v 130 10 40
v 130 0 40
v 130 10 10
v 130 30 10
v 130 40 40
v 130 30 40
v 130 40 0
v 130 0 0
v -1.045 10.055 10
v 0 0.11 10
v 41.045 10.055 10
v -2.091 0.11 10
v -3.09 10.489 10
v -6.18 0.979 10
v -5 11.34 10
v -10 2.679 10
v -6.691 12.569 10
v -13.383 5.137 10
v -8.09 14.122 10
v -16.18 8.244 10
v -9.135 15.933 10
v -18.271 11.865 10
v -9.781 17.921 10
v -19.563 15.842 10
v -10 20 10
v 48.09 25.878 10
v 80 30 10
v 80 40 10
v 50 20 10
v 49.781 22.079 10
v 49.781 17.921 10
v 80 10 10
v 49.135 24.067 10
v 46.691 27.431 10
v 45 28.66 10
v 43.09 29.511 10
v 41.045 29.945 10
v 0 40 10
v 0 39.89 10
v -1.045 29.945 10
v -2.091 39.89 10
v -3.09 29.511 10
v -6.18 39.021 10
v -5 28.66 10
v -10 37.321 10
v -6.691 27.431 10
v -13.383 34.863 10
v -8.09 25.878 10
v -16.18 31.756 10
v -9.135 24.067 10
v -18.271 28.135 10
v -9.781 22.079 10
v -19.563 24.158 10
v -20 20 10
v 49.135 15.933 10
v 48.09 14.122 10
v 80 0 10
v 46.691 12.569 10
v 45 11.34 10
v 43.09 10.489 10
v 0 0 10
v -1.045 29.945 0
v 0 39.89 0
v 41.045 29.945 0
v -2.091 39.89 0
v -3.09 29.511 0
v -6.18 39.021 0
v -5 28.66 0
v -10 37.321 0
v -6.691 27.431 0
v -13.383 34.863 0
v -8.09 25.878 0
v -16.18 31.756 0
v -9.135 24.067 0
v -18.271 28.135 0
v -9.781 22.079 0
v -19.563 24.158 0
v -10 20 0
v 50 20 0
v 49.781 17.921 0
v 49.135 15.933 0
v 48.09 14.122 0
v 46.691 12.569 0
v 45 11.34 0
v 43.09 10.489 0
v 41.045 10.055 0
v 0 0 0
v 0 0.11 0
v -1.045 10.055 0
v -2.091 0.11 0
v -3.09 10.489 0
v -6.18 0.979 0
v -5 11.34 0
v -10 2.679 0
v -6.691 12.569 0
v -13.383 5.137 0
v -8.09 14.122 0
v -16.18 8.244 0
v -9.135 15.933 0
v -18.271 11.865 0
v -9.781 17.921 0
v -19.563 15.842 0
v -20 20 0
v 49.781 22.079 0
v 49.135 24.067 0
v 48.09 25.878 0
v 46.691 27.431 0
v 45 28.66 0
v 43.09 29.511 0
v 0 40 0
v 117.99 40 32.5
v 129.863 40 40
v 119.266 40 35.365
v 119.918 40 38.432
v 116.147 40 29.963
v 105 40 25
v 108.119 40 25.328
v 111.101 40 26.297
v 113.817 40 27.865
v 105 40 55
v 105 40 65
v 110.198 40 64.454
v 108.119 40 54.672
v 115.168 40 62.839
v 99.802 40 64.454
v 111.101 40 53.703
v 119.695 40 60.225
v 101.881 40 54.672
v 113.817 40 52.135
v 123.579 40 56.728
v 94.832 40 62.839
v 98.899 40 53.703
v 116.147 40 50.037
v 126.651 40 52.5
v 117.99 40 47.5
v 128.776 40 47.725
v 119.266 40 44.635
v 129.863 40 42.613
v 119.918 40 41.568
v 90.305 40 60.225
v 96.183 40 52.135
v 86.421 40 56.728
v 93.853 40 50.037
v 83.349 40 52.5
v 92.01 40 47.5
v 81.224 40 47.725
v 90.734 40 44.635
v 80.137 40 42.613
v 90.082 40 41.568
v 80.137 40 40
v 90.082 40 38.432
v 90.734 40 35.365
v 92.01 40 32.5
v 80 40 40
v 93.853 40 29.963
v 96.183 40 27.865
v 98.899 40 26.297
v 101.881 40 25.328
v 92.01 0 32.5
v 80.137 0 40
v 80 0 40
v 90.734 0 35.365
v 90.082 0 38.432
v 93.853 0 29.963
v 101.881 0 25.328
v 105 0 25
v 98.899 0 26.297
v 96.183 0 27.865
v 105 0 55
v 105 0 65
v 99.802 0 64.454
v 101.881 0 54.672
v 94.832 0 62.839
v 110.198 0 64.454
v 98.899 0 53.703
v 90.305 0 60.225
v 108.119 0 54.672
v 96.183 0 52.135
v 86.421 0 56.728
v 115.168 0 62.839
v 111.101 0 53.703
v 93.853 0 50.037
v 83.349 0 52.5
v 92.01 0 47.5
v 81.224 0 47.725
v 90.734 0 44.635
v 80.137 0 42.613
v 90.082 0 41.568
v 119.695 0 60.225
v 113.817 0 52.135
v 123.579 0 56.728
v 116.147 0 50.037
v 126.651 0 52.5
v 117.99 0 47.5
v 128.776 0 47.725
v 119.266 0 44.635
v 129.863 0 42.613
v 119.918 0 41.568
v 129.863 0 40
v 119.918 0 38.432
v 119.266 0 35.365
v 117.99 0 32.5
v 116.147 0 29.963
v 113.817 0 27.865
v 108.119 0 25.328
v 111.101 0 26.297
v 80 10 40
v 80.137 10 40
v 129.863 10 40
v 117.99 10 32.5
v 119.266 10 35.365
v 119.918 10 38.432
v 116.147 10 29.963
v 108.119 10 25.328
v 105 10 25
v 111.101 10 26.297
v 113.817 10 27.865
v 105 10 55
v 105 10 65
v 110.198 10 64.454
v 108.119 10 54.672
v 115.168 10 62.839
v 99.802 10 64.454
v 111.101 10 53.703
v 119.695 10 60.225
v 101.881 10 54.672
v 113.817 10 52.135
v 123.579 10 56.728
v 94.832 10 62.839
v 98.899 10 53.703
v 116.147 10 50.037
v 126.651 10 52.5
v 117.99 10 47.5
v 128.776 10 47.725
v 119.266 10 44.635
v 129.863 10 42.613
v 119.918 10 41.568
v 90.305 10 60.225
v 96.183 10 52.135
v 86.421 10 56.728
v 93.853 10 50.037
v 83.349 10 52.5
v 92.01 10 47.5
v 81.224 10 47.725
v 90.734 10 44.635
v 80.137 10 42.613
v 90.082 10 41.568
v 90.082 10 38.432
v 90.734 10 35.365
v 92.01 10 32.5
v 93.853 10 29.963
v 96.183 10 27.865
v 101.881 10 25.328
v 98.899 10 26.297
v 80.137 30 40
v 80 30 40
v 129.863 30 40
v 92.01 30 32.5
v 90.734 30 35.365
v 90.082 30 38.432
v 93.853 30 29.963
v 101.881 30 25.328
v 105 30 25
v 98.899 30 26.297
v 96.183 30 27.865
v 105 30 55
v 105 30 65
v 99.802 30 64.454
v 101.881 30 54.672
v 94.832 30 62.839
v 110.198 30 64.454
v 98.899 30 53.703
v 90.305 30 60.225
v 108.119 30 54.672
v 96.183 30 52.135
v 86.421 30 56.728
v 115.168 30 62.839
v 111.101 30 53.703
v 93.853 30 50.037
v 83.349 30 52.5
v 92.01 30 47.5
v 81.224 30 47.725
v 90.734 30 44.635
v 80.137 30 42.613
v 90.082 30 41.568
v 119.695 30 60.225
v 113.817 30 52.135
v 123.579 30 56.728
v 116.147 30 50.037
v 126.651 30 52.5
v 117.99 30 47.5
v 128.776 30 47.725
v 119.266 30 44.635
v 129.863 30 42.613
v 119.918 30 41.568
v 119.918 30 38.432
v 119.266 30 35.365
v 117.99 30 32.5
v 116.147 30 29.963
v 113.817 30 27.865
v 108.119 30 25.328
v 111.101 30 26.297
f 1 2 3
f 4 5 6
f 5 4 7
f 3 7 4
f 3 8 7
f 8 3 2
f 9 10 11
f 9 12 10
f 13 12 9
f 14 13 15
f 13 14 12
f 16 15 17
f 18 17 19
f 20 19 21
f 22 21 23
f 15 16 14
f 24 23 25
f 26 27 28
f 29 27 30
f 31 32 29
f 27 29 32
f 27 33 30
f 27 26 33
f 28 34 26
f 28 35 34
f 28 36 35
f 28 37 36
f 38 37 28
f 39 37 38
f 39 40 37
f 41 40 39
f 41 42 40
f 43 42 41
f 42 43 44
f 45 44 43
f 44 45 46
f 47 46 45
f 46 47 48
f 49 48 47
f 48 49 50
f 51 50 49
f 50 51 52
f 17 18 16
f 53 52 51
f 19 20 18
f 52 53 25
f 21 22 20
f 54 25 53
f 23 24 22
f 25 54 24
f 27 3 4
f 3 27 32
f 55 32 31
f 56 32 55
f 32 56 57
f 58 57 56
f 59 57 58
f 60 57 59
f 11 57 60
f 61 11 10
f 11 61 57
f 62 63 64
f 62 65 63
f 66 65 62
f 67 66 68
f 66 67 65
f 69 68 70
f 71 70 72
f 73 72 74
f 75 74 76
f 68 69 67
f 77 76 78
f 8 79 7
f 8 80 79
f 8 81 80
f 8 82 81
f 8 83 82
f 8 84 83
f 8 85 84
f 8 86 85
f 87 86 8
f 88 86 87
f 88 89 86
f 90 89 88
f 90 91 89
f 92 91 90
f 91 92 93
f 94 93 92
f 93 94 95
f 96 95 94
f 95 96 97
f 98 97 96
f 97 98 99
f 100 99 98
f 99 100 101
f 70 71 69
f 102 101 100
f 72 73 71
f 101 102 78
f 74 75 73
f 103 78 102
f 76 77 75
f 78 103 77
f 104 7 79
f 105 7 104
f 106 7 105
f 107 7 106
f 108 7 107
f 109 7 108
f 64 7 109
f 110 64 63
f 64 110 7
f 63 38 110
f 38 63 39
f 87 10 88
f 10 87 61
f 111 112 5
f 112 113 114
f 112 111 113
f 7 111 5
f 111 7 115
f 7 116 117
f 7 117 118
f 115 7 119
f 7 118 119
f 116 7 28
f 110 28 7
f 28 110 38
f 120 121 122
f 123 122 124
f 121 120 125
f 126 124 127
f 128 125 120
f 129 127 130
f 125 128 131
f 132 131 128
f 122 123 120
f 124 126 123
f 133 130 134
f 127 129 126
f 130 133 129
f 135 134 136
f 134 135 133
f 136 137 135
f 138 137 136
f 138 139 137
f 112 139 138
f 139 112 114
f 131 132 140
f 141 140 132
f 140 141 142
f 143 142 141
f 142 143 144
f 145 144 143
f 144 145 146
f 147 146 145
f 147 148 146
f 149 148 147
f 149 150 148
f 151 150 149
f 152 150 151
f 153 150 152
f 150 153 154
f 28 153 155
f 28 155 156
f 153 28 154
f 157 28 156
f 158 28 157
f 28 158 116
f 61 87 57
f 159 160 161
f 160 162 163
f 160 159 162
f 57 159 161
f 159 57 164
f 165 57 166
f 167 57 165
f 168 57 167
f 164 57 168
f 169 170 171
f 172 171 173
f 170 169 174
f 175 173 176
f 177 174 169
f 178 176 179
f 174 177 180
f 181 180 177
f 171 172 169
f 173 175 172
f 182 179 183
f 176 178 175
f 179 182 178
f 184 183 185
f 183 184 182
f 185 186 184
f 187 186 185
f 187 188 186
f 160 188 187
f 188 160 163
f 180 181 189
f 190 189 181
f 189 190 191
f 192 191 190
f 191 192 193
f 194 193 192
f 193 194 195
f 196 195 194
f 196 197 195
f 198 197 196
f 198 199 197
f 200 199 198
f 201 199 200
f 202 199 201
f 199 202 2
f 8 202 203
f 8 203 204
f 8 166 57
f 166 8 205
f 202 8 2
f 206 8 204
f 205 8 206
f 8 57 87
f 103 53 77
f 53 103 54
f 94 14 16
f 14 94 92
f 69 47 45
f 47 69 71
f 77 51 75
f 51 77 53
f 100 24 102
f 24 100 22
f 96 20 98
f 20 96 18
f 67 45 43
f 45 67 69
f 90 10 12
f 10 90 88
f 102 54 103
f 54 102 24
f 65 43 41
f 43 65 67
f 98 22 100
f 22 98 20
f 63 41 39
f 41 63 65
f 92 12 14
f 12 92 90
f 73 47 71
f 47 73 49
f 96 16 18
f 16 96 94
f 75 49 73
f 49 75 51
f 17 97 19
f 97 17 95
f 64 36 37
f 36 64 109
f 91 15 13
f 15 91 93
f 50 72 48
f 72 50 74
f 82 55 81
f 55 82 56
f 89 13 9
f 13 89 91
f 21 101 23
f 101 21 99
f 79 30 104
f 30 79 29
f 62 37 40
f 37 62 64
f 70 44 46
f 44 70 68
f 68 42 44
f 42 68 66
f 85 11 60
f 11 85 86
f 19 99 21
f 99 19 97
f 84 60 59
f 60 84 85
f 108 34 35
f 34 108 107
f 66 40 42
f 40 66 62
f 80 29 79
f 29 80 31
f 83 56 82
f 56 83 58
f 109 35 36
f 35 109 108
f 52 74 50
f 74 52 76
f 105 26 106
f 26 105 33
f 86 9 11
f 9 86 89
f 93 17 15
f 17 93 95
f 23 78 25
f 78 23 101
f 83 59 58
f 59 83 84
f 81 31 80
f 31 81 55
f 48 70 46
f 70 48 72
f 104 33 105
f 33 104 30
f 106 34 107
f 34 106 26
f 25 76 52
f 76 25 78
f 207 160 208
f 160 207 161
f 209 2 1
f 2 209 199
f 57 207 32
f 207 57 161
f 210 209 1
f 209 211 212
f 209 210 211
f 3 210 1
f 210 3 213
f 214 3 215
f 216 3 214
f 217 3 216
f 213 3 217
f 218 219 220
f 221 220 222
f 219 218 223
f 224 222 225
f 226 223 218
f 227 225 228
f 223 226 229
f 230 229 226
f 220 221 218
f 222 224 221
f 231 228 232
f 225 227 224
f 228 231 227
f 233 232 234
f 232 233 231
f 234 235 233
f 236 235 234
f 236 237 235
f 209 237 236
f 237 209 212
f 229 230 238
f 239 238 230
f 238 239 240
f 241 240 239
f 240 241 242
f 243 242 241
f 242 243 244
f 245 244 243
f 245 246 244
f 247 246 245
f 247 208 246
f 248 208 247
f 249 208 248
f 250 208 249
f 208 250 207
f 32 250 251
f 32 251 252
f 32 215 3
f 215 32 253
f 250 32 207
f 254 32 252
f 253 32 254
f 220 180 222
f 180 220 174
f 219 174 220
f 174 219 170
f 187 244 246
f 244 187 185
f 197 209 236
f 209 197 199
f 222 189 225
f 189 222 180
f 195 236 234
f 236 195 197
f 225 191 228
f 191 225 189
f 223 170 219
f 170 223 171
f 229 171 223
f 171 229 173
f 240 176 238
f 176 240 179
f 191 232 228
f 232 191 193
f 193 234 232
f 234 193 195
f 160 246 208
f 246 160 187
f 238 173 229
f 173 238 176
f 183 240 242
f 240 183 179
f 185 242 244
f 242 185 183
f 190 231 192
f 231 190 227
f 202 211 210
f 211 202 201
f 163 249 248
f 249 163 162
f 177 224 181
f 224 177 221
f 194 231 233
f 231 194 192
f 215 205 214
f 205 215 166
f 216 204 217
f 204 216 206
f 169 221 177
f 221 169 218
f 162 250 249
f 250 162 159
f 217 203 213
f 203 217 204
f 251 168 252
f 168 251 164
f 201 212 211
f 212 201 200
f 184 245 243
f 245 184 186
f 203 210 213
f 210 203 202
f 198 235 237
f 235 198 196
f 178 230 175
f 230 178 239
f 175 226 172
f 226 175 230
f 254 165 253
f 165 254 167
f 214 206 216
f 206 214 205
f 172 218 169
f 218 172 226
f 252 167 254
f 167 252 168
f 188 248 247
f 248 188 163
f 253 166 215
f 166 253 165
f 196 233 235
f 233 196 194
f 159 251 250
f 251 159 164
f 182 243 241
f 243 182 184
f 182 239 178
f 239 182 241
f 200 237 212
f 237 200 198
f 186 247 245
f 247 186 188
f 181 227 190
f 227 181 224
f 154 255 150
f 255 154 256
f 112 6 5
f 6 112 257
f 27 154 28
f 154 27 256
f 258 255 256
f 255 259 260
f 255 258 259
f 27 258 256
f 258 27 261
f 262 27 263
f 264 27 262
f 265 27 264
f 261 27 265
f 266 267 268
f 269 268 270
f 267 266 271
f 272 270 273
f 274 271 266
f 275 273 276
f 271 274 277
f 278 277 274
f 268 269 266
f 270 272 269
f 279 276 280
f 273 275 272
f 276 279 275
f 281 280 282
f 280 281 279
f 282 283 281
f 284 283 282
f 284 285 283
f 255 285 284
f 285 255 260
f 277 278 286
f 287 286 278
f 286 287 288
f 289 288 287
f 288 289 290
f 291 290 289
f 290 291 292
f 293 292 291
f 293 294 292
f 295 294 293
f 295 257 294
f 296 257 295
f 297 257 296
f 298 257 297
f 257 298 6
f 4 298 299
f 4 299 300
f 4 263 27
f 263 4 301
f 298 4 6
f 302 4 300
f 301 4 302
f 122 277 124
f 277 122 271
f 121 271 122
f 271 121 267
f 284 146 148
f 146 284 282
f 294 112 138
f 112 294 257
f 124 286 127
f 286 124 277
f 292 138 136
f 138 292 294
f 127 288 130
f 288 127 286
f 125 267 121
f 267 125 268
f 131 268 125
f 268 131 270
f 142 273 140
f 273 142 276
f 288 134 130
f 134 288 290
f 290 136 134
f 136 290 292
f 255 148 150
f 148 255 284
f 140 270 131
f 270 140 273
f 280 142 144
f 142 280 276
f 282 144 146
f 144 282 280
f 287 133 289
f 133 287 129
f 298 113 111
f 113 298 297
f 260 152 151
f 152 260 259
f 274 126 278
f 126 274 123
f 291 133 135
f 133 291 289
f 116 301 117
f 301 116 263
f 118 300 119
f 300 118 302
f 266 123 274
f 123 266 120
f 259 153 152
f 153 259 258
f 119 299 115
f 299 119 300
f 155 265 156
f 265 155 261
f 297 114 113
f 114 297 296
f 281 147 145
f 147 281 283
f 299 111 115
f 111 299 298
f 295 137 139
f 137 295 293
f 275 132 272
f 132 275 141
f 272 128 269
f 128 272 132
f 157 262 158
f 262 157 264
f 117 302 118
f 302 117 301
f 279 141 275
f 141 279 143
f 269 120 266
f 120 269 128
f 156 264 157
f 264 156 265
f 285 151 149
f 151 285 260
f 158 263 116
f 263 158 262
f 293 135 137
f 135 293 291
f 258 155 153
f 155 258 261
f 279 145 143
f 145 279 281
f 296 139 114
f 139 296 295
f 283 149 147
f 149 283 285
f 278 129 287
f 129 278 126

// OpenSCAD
//base
baseX=130;
baseY=40;
baseZ=10;

// centros circulos base
cBase1=([0,20,0]);
cBase2=([40,20,0]);

//radios base
rBaseInt=10;
rBaseExt=20;

difference(){
union(){
cube([baseX,baseY,baseZ]);

translate(cBase1)
cylinder(baseZ,r=rBaseExt);
}

hull(){
translate(cBase1)
cylinder(baseZ+10,r=rBaseInt,center=true);

translate(cBase2)
cylinder(baseZ+10,r=rBaseInt);
}
}
//////////////////////////
// posición parte A
A=([130-50,0,0]);

//lado A
AX=50;
AY=10;
AZ=40;

//radiosA
rAint=15;
rAext=25;

// centroA
cA=([130-50/2,5,40]);

difference(){
    union(){
translate(A)
cube([AX,AY,AZ]);

translate(cA)
rotate([90,90,0])
cylinder(baseZ,r=rAext,center=true);
    }

translate(cA)
rotate([90,90,0])
cylinder(baseZ+10,r=rAint,center=true);
}
//////////////////////////
// posición B
B=([130-50,30,0]);

//lado B
BX=50;
BY=10;
BZ=40;

//radios
rBint=15;
rBext=25;

// centroB
cB=([130-50/2,35,40]);
difference(){
    union(){
translate(B)
cube([BX,BY,BZ]);

translate(cB)
rotate([90,90,0])
cylinder(baseZ,r=rBext,center=true);
    }
translate(cB)
rotate([90,90,0])
cylinder(baseZ+10,r=rBint,center=true);
}
